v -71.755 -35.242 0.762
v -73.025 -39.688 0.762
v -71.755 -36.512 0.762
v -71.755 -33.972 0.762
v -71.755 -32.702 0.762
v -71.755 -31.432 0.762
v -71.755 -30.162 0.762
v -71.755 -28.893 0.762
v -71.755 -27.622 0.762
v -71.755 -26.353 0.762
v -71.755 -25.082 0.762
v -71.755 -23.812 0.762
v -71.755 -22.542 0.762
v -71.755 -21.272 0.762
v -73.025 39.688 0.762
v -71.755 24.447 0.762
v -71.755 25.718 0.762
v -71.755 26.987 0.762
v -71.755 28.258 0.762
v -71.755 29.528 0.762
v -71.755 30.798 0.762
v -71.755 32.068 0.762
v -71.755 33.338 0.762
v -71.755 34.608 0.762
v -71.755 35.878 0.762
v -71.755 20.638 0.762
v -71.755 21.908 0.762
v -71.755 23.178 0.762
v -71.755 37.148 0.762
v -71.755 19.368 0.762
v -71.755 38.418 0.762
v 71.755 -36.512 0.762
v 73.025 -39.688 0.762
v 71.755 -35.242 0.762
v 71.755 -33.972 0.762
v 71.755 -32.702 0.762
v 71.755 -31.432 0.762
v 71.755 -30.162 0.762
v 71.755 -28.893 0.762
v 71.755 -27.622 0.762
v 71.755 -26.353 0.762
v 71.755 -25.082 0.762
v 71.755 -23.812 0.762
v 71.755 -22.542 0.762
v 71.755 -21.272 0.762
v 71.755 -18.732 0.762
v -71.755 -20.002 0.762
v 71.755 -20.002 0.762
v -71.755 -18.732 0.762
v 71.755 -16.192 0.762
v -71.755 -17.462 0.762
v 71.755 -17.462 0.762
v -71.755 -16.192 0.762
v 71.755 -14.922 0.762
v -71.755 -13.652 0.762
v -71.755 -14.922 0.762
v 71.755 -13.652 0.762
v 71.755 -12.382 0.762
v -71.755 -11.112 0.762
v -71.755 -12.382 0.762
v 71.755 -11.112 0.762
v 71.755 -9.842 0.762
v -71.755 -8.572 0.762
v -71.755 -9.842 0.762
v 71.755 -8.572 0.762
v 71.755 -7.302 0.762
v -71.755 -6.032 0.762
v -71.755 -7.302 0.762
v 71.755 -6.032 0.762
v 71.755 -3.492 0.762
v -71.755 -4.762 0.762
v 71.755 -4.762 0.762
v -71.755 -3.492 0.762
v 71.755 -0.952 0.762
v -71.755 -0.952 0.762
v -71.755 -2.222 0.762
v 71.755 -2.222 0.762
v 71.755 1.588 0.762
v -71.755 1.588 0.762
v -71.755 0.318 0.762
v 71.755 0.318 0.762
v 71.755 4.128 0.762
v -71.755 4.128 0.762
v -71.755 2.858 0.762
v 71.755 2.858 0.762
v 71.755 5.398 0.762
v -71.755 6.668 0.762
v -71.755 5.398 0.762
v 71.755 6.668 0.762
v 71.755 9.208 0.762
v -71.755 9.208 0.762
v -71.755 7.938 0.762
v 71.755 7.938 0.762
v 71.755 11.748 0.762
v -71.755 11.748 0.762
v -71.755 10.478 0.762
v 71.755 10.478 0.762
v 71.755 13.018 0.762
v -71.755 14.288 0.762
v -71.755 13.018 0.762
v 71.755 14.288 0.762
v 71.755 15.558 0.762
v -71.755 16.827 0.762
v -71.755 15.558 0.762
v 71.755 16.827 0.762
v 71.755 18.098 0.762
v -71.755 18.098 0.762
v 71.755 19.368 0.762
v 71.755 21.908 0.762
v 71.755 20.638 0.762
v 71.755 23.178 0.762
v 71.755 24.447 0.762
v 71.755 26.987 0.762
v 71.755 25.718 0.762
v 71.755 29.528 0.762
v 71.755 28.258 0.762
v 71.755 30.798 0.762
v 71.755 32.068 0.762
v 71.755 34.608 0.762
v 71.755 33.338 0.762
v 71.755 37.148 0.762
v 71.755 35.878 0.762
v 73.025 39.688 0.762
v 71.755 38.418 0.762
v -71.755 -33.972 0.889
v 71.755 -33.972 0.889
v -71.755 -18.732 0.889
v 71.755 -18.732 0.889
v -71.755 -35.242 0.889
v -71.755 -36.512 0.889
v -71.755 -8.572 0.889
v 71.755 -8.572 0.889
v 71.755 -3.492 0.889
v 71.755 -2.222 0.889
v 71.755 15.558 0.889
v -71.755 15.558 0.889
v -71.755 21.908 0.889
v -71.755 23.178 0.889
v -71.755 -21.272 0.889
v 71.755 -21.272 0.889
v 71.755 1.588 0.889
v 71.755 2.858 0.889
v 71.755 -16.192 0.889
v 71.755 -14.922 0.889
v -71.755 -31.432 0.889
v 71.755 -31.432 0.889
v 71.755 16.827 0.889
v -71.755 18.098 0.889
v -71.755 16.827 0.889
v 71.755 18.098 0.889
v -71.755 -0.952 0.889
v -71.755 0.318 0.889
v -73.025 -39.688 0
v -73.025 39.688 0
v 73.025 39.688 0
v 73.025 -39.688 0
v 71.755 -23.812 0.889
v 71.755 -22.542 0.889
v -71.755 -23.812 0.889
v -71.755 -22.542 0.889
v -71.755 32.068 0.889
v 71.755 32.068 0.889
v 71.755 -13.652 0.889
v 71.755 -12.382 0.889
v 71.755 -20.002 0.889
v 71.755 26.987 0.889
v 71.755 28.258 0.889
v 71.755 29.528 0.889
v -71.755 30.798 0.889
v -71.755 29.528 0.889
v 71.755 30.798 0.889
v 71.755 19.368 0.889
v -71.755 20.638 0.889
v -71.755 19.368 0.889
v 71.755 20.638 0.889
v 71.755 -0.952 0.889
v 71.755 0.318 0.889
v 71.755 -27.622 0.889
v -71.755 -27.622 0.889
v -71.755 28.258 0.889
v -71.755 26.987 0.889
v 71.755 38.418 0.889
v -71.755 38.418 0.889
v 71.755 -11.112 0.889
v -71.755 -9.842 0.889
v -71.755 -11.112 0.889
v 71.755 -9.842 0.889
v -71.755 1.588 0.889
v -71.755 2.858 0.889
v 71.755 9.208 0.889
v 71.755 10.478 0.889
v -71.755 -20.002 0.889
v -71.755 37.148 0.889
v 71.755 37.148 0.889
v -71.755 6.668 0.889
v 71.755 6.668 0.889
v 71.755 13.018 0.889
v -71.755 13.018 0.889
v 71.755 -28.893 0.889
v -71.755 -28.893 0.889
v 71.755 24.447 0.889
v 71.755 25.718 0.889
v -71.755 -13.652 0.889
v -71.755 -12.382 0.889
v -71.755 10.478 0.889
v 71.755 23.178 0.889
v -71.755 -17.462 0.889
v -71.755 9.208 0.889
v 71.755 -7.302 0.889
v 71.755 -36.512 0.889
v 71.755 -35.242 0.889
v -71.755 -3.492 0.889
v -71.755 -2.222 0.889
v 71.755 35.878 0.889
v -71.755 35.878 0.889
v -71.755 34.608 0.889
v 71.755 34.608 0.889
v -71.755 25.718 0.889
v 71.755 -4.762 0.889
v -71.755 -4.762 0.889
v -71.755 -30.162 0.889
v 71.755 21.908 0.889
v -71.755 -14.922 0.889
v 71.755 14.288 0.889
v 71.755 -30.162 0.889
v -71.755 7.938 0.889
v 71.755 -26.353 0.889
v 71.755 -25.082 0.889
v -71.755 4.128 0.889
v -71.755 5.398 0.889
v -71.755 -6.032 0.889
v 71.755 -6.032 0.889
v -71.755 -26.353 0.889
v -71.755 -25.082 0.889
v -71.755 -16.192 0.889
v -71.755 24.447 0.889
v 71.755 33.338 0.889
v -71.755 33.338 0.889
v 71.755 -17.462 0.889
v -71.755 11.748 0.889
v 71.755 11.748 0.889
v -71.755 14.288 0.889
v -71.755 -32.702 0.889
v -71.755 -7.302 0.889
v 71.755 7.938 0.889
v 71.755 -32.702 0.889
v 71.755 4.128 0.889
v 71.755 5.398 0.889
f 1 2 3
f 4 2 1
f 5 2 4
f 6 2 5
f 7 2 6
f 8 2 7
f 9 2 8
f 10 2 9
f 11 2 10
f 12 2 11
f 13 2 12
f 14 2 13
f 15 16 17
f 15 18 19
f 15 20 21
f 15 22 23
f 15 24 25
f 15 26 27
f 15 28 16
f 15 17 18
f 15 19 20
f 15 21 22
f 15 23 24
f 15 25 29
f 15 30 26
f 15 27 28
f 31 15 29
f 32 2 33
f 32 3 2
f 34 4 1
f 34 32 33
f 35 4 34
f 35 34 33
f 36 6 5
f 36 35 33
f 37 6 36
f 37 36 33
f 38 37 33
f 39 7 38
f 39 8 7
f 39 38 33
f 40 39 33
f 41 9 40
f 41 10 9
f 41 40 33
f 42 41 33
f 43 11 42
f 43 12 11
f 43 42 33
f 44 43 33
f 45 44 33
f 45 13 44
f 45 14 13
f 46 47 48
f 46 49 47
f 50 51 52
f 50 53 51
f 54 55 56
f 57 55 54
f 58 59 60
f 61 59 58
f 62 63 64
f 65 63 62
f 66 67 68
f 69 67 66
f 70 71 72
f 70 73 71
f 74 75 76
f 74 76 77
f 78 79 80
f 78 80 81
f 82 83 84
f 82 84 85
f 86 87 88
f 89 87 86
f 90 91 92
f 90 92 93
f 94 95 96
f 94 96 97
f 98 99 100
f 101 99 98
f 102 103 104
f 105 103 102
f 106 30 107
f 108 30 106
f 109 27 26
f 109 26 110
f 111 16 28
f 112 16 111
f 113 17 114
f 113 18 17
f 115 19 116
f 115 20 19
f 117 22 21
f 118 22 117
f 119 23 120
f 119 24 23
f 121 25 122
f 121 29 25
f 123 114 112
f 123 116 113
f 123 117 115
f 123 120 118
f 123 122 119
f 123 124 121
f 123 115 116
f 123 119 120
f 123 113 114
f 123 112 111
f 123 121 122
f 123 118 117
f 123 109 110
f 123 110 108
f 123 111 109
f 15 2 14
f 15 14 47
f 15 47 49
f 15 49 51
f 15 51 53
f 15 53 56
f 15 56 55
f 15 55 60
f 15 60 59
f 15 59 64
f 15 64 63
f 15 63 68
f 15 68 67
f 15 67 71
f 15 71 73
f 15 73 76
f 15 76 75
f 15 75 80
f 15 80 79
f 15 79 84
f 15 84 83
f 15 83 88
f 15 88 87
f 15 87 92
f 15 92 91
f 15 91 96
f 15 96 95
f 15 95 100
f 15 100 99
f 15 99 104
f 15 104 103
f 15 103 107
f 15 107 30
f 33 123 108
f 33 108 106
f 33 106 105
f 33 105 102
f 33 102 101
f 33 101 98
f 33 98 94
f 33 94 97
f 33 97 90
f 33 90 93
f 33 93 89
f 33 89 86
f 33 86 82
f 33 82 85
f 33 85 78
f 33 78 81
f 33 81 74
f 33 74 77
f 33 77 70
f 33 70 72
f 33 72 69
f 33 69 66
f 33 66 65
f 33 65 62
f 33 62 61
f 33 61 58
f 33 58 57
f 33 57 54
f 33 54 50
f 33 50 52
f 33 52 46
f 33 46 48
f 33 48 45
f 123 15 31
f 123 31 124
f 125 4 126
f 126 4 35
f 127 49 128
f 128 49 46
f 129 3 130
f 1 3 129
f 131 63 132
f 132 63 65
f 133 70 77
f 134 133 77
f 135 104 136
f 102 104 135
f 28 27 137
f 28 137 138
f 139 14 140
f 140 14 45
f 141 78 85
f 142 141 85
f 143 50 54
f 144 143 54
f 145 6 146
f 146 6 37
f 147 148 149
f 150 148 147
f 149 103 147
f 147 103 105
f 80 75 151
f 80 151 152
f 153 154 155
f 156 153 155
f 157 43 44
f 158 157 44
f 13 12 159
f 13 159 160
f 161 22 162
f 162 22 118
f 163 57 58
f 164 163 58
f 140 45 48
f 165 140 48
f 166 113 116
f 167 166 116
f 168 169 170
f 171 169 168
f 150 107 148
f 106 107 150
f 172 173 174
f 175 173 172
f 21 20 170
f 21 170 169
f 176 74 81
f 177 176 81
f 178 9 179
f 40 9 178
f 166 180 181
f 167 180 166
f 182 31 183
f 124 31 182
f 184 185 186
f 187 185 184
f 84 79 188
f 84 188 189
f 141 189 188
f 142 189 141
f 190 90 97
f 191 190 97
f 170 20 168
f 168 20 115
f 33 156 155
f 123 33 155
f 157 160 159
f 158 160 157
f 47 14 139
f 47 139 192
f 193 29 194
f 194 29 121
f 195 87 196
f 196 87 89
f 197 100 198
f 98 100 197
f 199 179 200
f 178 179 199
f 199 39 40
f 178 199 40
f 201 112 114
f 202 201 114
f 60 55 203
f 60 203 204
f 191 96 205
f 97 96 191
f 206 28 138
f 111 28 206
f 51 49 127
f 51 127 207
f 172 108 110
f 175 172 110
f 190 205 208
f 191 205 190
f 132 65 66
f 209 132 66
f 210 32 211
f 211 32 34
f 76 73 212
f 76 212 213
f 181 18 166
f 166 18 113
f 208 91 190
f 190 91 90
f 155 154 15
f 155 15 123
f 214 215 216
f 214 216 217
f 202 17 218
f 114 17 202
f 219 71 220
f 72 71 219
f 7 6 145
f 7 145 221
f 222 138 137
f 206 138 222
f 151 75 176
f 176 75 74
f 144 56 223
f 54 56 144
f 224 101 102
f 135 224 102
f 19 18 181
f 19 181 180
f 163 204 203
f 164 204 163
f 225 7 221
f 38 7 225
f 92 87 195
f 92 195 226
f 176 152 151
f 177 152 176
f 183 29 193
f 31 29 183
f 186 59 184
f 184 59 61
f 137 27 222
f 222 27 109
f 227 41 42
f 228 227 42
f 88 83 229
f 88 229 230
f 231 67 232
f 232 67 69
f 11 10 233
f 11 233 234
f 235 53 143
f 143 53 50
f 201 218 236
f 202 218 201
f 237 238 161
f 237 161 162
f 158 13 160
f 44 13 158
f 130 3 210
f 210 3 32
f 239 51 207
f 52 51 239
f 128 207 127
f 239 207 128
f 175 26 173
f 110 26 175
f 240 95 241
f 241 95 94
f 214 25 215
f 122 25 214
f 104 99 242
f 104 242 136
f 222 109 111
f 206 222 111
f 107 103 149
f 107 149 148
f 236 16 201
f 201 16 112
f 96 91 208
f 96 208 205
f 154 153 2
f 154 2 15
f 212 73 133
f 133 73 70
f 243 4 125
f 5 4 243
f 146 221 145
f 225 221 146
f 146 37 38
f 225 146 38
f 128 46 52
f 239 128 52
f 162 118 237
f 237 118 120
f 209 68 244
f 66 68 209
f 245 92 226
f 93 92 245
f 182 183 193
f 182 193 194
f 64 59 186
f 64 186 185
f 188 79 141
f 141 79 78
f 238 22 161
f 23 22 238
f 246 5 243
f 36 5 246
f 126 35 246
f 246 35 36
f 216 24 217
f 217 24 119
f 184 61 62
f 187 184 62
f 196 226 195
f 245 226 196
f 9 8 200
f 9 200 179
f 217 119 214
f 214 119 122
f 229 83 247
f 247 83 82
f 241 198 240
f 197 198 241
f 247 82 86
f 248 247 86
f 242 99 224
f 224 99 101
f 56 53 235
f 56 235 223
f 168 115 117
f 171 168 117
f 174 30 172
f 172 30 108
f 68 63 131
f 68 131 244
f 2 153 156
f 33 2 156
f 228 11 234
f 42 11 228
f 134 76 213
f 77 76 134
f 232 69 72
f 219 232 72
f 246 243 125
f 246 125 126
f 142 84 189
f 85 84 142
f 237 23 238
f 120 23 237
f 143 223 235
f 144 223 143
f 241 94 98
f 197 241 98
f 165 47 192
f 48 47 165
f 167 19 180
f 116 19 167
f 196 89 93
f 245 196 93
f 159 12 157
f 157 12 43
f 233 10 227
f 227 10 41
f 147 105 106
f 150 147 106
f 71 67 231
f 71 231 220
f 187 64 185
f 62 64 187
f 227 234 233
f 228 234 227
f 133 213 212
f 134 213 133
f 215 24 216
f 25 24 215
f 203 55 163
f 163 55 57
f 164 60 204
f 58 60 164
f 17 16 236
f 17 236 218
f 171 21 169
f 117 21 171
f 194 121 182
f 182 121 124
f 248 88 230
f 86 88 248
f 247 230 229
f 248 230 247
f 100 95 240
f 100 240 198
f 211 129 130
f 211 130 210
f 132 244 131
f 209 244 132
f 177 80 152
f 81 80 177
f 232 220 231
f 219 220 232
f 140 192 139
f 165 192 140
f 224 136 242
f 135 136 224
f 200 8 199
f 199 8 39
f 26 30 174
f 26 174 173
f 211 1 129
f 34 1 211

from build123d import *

# Parameters (mm, degrees)
F0_W     = 146.05
F0_H     = 79.375
F1_DEPTH = 0.762
F2_W     = 143.51
F2_H     = 1.27
F3_DEPTH = 0.127


with BuildPart() as f1:
    # F0 (on Top) → F1 (new body)
    with BuildSketch(Plane.XY):
        Rectangle(F0_W, F0_H)
    extrude(amount=F1_DEPTH)

    # F2 (on face) → F3 (join)
    with BuildSketch(Plane.XY.offset(0.762)):
        with Locations((0, 37.7825)):
            Rectangle(F2_W, F2_H)
        with Locations((0, 35.2425)):
            Rectangle(F2_W, F2_H)
        with Locations((0, 32.7025)):
            Rectangle(F2_W, F2_H)
        with Locations((0, 30.1625)):
            Rectangle(F2_W, F2_H)
        with Locations((0, 27.6225)):
            Rectangle(F2_W, F2_H)
        with Locations((0, 25.0825)):
            Rectangle(F2_W, F2_H)
        with Locations((0, 22.5425)):
            Rectangle(F2_W, F2_H)
        with Locations((0, 20.0025)):
            Rectangle(F2_W, F2_H)
        with Locations((0, 17.4625)):
            Rectangle(F2_W, F2_H)
        with Locations((0, 14.9225)):
            Rectangle(F2_W, F2_H)
        with Locations((0, 12.3825)):
            Rectangle(F2_W, F2_H)
        with Locations((0, 9.8425)):
            Rectangle(F2_W, F2_H)
        with Locations((0, 7.3025)):
            Rectangle(F2_W, F2_H)
        with Locations((0, 4.7625)):
            Rectangle(F2_W, F2_H)
        with Locations((0, 2.2225)):
            Rectangle(F2_W, F2_H)
        with Locations((0, -0.3175)):
            Rectangle(F2_W, F2_H)
        with Locations((0, -2.8575)):
            Rectangle(F2_W, F2_H)
        with Locations((0, -5.3975)):
            Rectangle(F2_W, F2_H)
        with Locations((0, -7.9375)):
            Rectangle(F2_W, F2_H)
        with Locations((0, -10.4775)):
            Rectangle(F2_W, F2_H)
        with Locations((0, -13.0175)):
            Rectangle(F2_W, F2_H)
        with Locations((0, -15.5575)):
            Rectangle(F2_W, F2_H)
        with Locations((0, -18.0975)):
            Rectangle(F2_W, F2_H)
        with Locations((0, -20.6375)):
            Rectangle(F2_W, F2_H)
        with Locations((0, -23.1775)):
            Rectangle(F2_W, F2_H)
        with Locations((0, -25.7175)):
            Rectangle(F2_W, F2_H)
        with Locations((0, -28.2575)):
            Rectangle(F2_W, F2_H)
        with Locations((0, -30.7975)):
            Rectangle(F2_W, F2_H)
        with Locations((0, -33.3375)):
            Rectangle(F2_W, F2_H)
        with Locations((0, -35.8775)):
            Rectangle(F2_W, F2_H)
    extrude(amount=F3_DEPTH)


solid = f1.part
